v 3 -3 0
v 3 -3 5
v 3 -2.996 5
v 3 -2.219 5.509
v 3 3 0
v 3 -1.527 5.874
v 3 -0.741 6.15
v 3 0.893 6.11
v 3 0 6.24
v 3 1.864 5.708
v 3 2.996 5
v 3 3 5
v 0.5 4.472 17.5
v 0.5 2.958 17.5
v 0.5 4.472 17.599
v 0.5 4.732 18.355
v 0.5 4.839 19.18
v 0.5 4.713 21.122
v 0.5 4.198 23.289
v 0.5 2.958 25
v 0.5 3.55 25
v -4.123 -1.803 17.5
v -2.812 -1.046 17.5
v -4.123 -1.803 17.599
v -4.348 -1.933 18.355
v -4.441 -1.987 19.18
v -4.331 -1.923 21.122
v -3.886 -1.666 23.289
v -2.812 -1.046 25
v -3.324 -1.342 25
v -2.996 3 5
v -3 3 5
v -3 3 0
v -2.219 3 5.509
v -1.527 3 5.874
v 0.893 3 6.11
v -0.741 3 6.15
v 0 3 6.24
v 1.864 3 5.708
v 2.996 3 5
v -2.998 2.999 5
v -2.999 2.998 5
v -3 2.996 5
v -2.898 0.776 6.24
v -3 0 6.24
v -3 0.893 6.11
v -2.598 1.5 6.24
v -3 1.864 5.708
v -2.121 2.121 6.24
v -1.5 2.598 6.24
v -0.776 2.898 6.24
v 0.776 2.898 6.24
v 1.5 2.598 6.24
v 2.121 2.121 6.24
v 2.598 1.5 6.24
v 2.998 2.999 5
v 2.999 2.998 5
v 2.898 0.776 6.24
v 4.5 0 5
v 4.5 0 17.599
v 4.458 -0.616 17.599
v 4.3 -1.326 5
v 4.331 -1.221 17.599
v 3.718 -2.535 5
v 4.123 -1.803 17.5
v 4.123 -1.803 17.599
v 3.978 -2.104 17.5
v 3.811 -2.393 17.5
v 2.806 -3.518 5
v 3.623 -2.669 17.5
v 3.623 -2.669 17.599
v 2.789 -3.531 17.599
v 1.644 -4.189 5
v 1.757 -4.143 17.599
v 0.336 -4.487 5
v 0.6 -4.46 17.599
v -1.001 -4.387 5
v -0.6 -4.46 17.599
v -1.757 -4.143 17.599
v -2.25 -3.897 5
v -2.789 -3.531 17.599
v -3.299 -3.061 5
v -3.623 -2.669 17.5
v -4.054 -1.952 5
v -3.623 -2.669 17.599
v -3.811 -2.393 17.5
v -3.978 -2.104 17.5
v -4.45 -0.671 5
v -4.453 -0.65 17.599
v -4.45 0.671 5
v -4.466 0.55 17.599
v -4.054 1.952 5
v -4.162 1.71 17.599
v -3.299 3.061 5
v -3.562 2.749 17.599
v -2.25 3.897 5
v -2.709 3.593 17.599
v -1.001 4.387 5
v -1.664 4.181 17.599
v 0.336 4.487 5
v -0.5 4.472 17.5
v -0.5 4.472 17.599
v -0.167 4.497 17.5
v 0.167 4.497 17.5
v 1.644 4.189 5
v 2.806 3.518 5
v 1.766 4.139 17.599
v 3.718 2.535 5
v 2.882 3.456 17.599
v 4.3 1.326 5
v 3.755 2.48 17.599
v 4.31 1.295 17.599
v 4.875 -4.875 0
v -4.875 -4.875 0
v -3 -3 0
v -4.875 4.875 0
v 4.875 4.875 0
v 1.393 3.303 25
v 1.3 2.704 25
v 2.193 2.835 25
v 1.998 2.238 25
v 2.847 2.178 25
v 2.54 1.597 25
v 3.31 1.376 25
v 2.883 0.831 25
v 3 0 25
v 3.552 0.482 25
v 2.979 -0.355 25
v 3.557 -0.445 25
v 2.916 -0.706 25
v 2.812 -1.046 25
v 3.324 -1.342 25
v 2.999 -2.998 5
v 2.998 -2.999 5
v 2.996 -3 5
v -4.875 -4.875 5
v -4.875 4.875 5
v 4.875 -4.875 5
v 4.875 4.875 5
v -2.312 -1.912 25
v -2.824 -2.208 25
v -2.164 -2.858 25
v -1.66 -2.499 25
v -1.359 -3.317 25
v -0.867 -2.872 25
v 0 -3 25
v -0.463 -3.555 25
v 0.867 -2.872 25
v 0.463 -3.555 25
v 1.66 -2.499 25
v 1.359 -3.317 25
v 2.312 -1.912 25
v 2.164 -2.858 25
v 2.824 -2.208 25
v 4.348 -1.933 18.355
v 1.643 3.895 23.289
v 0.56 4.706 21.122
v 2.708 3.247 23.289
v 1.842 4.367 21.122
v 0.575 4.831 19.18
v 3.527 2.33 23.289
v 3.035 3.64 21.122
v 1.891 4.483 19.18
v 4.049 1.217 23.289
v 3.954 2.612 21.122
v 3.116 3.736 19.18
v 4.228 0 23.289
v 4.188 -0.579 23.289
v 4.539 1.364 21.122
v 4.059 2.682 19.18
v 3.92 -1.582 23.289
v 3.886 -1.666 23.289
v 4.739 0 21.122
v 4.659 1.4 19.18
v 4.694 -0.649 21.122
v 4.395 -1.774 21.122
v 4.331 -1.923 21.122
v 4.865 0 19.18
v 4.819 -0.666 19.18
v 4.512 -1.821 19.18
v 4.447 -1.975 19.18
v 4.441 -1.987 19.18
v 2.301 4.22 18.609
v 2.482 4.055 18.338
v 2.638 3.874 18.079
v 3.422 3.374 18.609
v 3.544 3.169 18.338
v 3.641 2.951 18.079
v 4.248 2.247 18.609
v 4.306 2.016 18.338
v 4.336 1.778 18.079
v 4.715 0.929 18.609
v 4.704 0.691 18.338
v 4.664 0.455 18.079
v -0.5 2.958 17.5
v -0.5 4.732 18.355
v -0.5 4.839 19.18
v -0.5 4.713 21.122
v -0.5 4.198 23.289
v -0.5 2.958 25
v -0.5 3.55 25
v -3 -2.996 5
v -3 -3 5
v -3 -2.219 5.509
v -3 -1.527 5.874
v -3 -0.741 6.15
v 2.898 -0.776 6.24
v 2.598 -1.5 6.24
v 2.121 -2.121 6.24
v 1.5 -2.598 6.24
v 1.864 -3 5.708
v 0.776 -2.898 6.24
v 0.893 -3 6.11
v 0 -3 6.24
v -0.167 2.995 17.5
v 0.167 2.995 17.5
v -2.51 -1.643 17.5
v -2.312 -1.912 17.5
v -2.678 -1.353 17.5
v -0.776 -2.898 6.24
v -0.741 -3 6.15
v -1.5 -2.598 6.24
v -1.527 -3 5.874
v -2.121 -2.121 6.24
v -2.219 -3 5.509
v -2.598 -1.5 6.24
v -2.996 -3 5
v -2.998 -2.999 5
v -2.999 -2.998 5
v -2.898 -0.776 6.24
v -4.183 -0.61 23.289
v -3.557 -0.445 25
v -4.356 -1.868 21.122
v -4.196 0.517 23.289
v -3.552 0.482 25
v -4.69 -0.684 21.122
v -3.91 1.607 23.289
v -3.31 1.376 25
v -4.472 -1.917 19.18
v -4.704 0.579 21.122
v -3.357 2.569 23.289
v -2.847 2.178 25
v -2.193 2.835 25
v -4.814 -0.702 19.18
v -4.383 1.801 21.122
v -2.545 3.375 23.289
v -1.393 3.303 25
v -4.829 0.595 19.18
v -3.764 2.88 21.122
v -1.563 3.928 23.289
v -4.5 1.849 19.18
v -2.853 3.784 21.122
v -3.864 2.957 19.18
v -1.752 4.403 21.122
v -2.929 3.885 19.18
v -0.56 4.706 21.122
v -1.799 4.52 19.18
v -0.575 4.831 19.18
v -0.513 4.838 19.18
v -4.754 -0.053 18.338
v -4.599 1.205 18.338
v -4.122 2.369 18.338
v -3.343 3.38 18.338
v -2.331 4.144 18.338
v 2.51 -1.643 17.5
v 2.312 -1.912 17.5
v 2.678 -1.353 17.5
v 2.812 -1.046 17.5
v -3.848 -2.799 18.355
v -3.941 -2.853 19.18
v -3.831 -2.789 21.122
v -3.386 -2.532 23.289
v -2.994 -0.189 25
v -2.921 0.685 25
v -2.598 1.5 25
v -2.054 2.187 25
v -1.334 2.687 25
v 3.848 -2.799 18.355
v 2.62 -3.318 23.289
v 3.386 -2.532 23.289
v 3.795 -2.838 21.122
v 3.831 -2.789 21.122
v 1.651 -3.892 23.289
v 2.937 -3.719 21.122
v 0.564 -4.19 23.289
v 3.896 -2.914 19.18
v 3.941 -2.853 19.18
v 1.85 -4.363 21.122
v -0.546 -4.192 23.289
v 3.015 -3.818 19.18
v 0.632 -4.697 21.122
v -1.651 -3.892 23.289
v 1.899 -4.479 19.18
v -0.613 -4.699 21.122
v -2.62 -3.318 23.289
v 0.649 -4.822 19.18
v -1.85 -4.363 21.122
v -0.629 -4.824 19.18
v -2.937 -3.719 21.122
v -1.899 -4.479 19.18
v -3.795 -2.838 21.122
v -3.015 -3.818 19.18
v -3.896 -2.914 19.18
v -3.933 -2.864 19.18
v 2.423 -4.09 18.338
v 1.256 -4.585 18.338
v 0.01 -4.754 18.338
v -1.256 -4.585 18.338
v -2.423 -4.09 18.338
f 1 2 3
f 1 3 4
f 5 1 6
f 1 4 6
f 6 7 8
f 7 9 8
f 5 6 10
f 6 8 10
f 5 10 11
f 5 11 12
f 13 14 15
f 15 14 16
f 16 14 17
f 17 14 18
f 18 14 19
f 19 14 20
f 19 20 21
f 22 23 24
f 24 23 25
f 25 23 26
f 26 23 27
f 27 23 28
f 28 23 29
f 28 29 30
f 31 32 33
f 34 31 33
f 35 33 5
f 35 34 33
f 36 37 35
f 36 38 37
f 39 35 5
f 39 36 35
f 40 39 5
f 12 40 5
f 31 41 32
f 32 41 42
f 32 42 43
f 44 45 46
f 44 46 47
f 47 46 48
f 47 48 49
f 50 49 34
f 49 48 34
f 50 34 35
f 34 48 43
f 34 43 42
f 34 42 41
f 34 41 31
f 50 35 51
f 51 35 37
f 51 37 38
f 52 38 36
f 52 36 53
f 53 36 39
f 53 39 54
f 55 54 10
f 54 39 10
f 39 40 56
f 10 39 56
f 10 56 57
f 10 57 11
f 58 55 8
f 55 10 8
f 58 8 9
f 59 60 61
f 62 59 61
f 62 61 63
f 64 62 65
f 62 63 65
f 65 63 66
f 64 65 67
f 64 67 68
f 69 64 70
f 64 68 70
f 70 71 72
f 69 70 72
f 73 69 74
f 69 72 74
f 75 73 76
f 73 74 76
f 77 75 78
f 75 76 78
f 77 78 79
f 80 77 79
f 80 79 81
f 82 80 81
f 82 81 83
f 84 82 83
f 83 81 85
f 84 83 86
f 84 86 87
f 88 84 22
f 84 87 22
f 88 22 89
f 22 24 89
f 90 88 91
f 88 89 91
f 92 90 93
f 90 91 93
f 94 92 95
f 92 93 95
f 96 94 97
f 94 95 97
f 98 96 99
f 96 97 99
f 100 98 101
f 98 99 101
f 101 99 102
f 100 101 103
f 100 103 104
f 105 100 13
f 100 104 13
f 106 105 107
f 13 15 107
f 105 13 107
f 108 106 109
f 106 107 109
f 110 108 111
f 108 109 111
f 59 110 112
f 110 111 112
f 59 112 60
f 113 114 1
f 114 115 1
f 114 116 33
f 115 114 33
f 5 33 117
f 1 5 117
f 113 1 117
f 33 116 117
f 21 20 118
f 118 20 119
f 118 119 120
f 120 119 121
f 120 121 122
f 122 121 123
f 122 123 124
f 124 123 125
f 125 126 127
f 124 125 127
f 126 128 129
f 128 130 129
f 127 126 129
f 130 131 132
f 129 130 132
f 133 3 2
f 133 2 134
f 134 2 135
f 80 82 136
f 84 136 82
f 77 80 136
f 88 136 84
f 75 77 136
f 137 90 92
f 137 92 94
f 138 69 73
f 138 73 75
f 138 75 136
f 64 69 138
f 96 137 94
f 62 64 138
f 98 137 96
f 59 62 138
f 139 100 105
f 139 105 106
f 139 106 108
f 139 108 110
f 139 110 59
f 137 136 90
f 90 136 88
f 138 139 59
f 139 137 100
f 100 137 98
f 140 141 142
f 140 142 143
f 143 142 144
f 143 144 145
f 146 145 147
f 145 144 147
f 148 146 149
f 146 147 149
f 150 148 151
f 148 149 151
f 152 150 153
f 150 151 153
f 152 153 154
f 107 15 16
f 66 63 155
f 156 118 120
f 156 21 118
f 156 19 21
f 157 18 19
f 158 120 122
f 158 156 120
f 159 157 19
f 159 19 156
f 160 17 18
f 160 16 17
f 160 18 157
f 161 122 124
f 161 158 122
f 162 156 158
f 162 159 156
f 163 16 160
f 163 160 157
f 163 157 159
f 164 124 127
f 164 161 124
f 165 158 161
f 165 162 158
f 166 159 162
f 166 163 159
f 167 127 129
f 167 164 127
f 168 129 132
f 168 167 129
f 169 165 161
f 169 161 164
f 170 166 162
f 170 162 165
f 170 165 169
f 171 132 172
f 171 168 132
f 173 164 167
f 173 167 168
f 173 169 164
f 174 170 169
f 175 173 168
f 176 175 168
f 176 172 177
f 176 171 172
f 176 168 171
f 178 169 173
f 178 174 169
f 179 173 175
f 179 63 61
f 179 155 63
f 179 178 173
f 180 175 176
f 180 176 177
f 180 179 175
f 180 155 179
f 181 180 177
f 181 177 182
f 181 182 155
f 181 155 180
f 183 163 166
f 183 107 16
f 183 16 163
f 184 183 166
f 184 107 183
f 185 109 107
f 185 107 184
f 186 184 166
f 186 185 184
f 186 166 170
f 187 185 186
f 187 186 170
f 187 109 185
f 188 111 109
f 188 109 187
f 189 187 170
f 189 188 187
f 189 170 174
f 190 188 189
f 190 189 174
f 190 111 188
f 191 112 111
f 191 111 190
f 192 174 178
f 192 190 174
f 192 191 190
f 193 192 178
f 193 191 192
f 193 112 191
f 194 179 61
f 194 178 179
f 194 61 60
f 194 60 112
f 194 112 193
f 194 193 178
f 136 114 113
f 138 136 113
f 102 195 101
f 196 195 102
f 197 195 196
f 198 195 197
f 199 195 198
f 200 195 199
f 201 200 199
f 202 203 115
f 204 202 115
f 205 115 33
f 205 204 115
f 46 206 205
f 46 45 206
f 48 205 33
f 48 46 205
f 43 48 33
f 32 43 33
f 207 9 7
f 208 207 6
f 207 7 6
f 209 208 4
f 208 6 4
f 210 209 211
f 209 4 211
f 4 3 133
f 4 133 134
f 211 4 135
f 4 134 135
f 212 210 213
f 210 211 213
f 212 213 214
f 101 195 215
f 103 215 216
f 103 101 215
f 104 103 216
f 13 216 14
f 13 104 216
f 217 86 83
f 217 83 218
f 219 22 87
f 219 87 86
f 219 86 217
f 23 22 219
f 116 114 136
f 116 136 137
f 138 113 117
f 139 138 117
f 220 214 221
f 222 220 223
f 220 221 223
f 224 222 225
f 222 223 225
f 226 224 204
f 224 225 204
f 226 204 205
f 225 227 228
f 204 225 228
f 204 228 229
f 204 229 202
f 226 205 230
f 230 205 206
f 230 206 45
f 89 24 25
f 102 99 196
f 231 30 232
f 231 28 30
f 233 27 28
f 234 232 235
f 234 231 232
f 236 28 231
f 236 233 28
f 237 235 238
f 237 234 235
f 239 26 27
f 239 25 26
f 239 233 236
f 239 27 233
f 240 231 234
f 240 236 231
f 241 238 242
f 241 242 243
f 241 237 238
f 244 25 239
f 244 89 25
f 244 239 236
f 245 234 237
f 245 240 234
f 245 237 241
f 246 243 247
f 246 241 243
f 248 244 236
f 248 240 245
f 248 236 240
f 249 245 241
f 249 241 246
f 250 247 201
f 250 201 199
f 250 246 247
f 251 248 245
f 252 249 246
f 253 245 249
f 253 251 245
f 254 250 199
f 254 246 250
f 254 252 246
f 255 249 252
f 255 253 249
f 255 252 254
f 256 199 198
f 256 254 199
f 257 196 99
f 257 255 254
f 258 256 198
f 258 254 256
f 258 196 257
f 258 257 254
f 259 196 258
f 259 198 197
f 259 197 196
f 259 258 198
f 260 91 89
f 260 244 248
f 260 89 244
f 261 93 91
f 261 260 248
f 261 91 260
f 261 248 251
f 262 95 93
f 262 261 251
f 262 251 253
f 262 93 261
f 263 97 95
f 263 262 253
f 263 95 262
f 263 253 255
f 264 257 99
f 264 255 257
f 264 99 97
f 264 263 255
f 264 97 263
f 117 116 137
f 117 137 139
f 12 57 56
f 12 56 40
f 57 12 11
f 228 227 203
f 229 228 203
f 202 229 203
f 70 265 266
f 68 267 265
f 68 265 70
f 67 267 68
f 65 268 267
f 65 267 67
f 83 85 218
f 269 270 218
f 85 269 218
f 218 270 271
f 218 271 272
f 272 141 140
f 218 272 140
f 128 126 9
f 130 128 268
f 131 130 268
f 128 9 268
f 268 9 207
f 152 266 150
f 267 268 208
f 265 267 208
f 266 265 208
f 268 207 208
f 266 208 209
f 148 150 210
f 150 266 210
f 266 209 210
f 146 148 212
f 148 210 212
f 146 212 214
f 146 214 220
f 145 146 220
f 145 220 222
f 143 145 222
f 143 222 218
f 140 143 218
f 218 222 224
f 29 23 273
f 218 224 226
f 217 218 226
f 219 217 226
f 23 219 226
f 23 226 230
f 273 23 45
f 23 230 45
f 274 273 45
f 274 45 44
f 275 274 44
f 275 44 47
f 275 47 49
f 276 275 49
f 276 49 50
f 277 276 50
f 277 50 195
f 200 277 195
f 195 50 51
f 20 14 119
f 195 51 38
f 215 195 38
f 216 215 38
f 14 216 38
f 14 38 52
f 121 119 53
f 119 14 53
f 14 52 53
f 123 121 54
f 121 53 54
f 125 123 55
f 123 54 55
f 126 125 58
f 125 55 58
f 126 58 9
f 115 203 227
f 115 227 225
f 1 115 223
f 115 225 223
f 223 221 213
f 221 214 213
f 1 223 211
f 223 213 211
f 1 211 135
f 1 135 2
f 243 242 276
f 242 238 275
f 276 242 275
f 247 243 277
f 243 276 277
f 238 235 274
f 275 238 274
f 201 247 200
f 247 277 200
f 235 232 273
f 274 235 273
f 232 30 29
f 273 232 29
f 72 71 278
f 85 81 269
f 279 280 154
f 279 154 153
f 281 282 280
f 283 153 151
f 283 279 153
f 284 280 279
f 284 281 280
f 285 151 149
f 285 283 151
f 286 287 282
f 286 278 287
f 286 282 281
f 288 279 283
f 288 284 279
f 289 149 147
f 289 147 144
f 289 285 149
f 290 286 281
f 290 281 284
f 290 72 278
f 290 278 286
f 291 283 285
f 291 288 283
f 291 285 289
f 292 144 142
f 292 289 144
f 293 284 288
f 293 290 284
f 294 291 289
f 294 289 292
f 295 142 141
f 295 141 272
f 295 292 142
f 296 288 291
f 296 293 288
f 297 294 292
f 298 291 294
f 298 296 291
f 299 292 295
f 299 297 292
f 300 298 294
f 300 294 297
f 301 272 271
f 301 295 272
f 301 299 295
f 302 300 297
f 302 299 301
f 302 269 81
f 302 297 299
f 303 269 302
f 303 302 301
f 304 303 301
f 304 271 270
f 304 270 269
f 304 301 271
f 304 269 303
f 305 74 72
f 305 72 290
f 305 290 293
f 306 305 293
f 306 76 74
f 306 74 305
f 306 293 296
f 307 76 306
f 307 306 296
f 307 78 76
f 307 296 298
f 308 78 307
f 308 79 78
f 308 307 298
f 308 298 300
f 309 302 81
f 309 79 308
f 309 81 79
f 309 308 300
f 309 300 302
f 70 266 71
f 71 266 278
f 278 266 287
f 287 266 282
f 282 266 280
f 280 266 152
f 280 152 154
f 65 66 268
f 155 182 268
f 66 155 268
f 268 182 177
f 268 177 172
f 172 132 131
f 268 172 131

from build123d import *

# Parameters (mm, degrees)
F0_W         = 9.75
F0_H         = 9.75
F0_W_2       = 6
F0_H_2       = 6
F1_DEPTH     = 5
F4_W         = 1
F4_H         = 10.4783805975
F5_DEPTH     = 7.5
F6_T4_ANGLE  = 90
F6_T10_ANGLE = 90
F6_T16_ANGLE = 90
F6_T22_ANGLE = 90


# Not quite as in the source:
# - a fillet or chamfer that OpenCascade refuses, or shapes differently, is made with other operations: its cross-section is extruded or revolved along the edge and cut away or added


with BuildPart() as f1:
    # F0 (on Top) → F1 (new body)
    with BuildSketch(Plane.XY):
        Rectangle(F0_W, F0_H)
        Rectangle(F0_W_2, F0_H_2, mode=Mode.SUBTRACT)
    extrude(amount=F1_DEPTH)

    # F2 (on Front) → F3 (revolve)
    with BuildSketch(Plane.XZ):
        with BuildLine():
            Line((3, 25), (3, 5))
            Line((3, 5), (4.5, 5))
            Line((4.5, 5), (4.5, 17.5993331894))
            add(Edge.make_bspline(
                [(3.5845720258, 25), (4.1028451178, 23.9598143656), (5.5548848687, 19.7320627697), (4.5, 17.5993331894)],
                knots=[0, 0, 0, 0, 7.4570689696, 7.4570689696, 7.4570689696, 7.4570689696], degree=3))
            Line((3.5845720258, 25), (3, 25))
        make_face()
    revolve(axis=Axis((0, 0, 5.0040013157), (0, 0, -1)))

    # F4 (on face) → F5 (cut)
    with BuildSketch(Plane.XY.offset(25)):
        with Locations((0, 5.5278654333)):
            Rectangle(F4_W, F4_H)
        Polygon((0, -0.5773502692), (-0.5, 0.2886751346), (-9.574543788, -4.9505151642), (-9.074543788, -5.8165405679), align=None)
        Polygon((0.5, 0.2886751346), (-0.5, 0.2886751346), (0, -0.5773502692), align=None)
        Polygon((9.574543788, -4.9505151642), (0.5, 0.2886751346), (0, -0.5773502692), (9.074543788, -5.8165405679), align=None)
    extrude(amount=-F5_DEPTH, mode=Mode.SUBTRACT)

    # F6: chamfer of 1.24 on 1 edges, made by hand


with BuildPart() as f6_tool2:
    # F6_s3 → F6_t4 (revolve)
    with BuildSketch(Plane.YZ):
        Polygon((-3, 6.24), (-4.24, 5), (-3, 5), align=None)
    revolve(axis=Axis((0, 0, 5), (0, 0, -1)), revolution_arc=F6_T4_ANGLE)

    split(bisect_by=Plane.XZ.offset(3), keep=Keep.BOTTOM)

    split(bisect_by=Plane.YZ.offset(-3), keep=Keep.TOP)


with BuildPart() as f1_1:
    add(f1.part)

    # F6_t1: cut F6_tool2
    add(f6_tool2.part, mode=Mode.SUBTRACT)


with BuildPart() as f6_tool8:
    # F6_s9 → F6_t10 (revolve)
    with BuildSketch(Plane.XZ):
        Polygon((3, 6.24), (4.24, 5), (3, 5), align=None)
    revolve(axis=Axis((0, 0, 5), (0, 0, -1)), revolution_arc=F6_T10_ANGLE)

    split(bisect_by=Plane.YZ.offset(3), keep=Keep.BOTTOM)

    split(bisect_by=Plane.XZ.offset(3), keep=Keep.BOTTOM)


with BuildPart() as f1_2:
    add(f1_1.part)

    # F6_t7: cut F6_tool8
    add(f6_tool8.part, mode=Mode.SUBTRACT)


with BuildPart() as f6_tool14:
    # F6_s15 → F6_t16 (revolve)
    with BuildSketch(Plane.XZ):
        Polygon((-3, 6.24), (-4.24, 5), (-3, 5), align=None)
    revolve(axis=Axis((0, 0, 5), (0, 0, -1)), revolution_arc=F6_T16_ANGLE)

    split(bisect_by=Plane.YZ.offset(-3), keep=Keep.TOP)

    split(bisect_by=Plane.XZ.offset(-3), keep=Keep.TOP)


with BuildPart() as f1_3:
    add(f1_2.part)

    # F6_t13: cut F6_tool14
    add(f6_tool14.part, mode=Mode.SUBTRACT)


with BuildPart() as f6_tool20:
    # F6_s21 → F6_t22 (revolve)
    with BuildSketch(Plane.YZ):
        Polygon((3, 6.24), (4.24, 5), (3, 5), align=None)
    revolve(axis=Axis((0, 0, 5), (0, 0, -1)), revolution_arc=F6_T22_ANGLE)

    split(bisect_by=Plane.YZ.offset(3), keep=Keep.BOTTOM)

    split(bisect_by=Plane.XZ.offset(-3), keep=Keep.TOP)


with BuildPart() as f1_4:
    add(f1_3.part)

    # F6_t19: cut F6_tool20
    add(f6_tool20.part, mode=Mode.SUBTRACT)


solid = f1_4.part
